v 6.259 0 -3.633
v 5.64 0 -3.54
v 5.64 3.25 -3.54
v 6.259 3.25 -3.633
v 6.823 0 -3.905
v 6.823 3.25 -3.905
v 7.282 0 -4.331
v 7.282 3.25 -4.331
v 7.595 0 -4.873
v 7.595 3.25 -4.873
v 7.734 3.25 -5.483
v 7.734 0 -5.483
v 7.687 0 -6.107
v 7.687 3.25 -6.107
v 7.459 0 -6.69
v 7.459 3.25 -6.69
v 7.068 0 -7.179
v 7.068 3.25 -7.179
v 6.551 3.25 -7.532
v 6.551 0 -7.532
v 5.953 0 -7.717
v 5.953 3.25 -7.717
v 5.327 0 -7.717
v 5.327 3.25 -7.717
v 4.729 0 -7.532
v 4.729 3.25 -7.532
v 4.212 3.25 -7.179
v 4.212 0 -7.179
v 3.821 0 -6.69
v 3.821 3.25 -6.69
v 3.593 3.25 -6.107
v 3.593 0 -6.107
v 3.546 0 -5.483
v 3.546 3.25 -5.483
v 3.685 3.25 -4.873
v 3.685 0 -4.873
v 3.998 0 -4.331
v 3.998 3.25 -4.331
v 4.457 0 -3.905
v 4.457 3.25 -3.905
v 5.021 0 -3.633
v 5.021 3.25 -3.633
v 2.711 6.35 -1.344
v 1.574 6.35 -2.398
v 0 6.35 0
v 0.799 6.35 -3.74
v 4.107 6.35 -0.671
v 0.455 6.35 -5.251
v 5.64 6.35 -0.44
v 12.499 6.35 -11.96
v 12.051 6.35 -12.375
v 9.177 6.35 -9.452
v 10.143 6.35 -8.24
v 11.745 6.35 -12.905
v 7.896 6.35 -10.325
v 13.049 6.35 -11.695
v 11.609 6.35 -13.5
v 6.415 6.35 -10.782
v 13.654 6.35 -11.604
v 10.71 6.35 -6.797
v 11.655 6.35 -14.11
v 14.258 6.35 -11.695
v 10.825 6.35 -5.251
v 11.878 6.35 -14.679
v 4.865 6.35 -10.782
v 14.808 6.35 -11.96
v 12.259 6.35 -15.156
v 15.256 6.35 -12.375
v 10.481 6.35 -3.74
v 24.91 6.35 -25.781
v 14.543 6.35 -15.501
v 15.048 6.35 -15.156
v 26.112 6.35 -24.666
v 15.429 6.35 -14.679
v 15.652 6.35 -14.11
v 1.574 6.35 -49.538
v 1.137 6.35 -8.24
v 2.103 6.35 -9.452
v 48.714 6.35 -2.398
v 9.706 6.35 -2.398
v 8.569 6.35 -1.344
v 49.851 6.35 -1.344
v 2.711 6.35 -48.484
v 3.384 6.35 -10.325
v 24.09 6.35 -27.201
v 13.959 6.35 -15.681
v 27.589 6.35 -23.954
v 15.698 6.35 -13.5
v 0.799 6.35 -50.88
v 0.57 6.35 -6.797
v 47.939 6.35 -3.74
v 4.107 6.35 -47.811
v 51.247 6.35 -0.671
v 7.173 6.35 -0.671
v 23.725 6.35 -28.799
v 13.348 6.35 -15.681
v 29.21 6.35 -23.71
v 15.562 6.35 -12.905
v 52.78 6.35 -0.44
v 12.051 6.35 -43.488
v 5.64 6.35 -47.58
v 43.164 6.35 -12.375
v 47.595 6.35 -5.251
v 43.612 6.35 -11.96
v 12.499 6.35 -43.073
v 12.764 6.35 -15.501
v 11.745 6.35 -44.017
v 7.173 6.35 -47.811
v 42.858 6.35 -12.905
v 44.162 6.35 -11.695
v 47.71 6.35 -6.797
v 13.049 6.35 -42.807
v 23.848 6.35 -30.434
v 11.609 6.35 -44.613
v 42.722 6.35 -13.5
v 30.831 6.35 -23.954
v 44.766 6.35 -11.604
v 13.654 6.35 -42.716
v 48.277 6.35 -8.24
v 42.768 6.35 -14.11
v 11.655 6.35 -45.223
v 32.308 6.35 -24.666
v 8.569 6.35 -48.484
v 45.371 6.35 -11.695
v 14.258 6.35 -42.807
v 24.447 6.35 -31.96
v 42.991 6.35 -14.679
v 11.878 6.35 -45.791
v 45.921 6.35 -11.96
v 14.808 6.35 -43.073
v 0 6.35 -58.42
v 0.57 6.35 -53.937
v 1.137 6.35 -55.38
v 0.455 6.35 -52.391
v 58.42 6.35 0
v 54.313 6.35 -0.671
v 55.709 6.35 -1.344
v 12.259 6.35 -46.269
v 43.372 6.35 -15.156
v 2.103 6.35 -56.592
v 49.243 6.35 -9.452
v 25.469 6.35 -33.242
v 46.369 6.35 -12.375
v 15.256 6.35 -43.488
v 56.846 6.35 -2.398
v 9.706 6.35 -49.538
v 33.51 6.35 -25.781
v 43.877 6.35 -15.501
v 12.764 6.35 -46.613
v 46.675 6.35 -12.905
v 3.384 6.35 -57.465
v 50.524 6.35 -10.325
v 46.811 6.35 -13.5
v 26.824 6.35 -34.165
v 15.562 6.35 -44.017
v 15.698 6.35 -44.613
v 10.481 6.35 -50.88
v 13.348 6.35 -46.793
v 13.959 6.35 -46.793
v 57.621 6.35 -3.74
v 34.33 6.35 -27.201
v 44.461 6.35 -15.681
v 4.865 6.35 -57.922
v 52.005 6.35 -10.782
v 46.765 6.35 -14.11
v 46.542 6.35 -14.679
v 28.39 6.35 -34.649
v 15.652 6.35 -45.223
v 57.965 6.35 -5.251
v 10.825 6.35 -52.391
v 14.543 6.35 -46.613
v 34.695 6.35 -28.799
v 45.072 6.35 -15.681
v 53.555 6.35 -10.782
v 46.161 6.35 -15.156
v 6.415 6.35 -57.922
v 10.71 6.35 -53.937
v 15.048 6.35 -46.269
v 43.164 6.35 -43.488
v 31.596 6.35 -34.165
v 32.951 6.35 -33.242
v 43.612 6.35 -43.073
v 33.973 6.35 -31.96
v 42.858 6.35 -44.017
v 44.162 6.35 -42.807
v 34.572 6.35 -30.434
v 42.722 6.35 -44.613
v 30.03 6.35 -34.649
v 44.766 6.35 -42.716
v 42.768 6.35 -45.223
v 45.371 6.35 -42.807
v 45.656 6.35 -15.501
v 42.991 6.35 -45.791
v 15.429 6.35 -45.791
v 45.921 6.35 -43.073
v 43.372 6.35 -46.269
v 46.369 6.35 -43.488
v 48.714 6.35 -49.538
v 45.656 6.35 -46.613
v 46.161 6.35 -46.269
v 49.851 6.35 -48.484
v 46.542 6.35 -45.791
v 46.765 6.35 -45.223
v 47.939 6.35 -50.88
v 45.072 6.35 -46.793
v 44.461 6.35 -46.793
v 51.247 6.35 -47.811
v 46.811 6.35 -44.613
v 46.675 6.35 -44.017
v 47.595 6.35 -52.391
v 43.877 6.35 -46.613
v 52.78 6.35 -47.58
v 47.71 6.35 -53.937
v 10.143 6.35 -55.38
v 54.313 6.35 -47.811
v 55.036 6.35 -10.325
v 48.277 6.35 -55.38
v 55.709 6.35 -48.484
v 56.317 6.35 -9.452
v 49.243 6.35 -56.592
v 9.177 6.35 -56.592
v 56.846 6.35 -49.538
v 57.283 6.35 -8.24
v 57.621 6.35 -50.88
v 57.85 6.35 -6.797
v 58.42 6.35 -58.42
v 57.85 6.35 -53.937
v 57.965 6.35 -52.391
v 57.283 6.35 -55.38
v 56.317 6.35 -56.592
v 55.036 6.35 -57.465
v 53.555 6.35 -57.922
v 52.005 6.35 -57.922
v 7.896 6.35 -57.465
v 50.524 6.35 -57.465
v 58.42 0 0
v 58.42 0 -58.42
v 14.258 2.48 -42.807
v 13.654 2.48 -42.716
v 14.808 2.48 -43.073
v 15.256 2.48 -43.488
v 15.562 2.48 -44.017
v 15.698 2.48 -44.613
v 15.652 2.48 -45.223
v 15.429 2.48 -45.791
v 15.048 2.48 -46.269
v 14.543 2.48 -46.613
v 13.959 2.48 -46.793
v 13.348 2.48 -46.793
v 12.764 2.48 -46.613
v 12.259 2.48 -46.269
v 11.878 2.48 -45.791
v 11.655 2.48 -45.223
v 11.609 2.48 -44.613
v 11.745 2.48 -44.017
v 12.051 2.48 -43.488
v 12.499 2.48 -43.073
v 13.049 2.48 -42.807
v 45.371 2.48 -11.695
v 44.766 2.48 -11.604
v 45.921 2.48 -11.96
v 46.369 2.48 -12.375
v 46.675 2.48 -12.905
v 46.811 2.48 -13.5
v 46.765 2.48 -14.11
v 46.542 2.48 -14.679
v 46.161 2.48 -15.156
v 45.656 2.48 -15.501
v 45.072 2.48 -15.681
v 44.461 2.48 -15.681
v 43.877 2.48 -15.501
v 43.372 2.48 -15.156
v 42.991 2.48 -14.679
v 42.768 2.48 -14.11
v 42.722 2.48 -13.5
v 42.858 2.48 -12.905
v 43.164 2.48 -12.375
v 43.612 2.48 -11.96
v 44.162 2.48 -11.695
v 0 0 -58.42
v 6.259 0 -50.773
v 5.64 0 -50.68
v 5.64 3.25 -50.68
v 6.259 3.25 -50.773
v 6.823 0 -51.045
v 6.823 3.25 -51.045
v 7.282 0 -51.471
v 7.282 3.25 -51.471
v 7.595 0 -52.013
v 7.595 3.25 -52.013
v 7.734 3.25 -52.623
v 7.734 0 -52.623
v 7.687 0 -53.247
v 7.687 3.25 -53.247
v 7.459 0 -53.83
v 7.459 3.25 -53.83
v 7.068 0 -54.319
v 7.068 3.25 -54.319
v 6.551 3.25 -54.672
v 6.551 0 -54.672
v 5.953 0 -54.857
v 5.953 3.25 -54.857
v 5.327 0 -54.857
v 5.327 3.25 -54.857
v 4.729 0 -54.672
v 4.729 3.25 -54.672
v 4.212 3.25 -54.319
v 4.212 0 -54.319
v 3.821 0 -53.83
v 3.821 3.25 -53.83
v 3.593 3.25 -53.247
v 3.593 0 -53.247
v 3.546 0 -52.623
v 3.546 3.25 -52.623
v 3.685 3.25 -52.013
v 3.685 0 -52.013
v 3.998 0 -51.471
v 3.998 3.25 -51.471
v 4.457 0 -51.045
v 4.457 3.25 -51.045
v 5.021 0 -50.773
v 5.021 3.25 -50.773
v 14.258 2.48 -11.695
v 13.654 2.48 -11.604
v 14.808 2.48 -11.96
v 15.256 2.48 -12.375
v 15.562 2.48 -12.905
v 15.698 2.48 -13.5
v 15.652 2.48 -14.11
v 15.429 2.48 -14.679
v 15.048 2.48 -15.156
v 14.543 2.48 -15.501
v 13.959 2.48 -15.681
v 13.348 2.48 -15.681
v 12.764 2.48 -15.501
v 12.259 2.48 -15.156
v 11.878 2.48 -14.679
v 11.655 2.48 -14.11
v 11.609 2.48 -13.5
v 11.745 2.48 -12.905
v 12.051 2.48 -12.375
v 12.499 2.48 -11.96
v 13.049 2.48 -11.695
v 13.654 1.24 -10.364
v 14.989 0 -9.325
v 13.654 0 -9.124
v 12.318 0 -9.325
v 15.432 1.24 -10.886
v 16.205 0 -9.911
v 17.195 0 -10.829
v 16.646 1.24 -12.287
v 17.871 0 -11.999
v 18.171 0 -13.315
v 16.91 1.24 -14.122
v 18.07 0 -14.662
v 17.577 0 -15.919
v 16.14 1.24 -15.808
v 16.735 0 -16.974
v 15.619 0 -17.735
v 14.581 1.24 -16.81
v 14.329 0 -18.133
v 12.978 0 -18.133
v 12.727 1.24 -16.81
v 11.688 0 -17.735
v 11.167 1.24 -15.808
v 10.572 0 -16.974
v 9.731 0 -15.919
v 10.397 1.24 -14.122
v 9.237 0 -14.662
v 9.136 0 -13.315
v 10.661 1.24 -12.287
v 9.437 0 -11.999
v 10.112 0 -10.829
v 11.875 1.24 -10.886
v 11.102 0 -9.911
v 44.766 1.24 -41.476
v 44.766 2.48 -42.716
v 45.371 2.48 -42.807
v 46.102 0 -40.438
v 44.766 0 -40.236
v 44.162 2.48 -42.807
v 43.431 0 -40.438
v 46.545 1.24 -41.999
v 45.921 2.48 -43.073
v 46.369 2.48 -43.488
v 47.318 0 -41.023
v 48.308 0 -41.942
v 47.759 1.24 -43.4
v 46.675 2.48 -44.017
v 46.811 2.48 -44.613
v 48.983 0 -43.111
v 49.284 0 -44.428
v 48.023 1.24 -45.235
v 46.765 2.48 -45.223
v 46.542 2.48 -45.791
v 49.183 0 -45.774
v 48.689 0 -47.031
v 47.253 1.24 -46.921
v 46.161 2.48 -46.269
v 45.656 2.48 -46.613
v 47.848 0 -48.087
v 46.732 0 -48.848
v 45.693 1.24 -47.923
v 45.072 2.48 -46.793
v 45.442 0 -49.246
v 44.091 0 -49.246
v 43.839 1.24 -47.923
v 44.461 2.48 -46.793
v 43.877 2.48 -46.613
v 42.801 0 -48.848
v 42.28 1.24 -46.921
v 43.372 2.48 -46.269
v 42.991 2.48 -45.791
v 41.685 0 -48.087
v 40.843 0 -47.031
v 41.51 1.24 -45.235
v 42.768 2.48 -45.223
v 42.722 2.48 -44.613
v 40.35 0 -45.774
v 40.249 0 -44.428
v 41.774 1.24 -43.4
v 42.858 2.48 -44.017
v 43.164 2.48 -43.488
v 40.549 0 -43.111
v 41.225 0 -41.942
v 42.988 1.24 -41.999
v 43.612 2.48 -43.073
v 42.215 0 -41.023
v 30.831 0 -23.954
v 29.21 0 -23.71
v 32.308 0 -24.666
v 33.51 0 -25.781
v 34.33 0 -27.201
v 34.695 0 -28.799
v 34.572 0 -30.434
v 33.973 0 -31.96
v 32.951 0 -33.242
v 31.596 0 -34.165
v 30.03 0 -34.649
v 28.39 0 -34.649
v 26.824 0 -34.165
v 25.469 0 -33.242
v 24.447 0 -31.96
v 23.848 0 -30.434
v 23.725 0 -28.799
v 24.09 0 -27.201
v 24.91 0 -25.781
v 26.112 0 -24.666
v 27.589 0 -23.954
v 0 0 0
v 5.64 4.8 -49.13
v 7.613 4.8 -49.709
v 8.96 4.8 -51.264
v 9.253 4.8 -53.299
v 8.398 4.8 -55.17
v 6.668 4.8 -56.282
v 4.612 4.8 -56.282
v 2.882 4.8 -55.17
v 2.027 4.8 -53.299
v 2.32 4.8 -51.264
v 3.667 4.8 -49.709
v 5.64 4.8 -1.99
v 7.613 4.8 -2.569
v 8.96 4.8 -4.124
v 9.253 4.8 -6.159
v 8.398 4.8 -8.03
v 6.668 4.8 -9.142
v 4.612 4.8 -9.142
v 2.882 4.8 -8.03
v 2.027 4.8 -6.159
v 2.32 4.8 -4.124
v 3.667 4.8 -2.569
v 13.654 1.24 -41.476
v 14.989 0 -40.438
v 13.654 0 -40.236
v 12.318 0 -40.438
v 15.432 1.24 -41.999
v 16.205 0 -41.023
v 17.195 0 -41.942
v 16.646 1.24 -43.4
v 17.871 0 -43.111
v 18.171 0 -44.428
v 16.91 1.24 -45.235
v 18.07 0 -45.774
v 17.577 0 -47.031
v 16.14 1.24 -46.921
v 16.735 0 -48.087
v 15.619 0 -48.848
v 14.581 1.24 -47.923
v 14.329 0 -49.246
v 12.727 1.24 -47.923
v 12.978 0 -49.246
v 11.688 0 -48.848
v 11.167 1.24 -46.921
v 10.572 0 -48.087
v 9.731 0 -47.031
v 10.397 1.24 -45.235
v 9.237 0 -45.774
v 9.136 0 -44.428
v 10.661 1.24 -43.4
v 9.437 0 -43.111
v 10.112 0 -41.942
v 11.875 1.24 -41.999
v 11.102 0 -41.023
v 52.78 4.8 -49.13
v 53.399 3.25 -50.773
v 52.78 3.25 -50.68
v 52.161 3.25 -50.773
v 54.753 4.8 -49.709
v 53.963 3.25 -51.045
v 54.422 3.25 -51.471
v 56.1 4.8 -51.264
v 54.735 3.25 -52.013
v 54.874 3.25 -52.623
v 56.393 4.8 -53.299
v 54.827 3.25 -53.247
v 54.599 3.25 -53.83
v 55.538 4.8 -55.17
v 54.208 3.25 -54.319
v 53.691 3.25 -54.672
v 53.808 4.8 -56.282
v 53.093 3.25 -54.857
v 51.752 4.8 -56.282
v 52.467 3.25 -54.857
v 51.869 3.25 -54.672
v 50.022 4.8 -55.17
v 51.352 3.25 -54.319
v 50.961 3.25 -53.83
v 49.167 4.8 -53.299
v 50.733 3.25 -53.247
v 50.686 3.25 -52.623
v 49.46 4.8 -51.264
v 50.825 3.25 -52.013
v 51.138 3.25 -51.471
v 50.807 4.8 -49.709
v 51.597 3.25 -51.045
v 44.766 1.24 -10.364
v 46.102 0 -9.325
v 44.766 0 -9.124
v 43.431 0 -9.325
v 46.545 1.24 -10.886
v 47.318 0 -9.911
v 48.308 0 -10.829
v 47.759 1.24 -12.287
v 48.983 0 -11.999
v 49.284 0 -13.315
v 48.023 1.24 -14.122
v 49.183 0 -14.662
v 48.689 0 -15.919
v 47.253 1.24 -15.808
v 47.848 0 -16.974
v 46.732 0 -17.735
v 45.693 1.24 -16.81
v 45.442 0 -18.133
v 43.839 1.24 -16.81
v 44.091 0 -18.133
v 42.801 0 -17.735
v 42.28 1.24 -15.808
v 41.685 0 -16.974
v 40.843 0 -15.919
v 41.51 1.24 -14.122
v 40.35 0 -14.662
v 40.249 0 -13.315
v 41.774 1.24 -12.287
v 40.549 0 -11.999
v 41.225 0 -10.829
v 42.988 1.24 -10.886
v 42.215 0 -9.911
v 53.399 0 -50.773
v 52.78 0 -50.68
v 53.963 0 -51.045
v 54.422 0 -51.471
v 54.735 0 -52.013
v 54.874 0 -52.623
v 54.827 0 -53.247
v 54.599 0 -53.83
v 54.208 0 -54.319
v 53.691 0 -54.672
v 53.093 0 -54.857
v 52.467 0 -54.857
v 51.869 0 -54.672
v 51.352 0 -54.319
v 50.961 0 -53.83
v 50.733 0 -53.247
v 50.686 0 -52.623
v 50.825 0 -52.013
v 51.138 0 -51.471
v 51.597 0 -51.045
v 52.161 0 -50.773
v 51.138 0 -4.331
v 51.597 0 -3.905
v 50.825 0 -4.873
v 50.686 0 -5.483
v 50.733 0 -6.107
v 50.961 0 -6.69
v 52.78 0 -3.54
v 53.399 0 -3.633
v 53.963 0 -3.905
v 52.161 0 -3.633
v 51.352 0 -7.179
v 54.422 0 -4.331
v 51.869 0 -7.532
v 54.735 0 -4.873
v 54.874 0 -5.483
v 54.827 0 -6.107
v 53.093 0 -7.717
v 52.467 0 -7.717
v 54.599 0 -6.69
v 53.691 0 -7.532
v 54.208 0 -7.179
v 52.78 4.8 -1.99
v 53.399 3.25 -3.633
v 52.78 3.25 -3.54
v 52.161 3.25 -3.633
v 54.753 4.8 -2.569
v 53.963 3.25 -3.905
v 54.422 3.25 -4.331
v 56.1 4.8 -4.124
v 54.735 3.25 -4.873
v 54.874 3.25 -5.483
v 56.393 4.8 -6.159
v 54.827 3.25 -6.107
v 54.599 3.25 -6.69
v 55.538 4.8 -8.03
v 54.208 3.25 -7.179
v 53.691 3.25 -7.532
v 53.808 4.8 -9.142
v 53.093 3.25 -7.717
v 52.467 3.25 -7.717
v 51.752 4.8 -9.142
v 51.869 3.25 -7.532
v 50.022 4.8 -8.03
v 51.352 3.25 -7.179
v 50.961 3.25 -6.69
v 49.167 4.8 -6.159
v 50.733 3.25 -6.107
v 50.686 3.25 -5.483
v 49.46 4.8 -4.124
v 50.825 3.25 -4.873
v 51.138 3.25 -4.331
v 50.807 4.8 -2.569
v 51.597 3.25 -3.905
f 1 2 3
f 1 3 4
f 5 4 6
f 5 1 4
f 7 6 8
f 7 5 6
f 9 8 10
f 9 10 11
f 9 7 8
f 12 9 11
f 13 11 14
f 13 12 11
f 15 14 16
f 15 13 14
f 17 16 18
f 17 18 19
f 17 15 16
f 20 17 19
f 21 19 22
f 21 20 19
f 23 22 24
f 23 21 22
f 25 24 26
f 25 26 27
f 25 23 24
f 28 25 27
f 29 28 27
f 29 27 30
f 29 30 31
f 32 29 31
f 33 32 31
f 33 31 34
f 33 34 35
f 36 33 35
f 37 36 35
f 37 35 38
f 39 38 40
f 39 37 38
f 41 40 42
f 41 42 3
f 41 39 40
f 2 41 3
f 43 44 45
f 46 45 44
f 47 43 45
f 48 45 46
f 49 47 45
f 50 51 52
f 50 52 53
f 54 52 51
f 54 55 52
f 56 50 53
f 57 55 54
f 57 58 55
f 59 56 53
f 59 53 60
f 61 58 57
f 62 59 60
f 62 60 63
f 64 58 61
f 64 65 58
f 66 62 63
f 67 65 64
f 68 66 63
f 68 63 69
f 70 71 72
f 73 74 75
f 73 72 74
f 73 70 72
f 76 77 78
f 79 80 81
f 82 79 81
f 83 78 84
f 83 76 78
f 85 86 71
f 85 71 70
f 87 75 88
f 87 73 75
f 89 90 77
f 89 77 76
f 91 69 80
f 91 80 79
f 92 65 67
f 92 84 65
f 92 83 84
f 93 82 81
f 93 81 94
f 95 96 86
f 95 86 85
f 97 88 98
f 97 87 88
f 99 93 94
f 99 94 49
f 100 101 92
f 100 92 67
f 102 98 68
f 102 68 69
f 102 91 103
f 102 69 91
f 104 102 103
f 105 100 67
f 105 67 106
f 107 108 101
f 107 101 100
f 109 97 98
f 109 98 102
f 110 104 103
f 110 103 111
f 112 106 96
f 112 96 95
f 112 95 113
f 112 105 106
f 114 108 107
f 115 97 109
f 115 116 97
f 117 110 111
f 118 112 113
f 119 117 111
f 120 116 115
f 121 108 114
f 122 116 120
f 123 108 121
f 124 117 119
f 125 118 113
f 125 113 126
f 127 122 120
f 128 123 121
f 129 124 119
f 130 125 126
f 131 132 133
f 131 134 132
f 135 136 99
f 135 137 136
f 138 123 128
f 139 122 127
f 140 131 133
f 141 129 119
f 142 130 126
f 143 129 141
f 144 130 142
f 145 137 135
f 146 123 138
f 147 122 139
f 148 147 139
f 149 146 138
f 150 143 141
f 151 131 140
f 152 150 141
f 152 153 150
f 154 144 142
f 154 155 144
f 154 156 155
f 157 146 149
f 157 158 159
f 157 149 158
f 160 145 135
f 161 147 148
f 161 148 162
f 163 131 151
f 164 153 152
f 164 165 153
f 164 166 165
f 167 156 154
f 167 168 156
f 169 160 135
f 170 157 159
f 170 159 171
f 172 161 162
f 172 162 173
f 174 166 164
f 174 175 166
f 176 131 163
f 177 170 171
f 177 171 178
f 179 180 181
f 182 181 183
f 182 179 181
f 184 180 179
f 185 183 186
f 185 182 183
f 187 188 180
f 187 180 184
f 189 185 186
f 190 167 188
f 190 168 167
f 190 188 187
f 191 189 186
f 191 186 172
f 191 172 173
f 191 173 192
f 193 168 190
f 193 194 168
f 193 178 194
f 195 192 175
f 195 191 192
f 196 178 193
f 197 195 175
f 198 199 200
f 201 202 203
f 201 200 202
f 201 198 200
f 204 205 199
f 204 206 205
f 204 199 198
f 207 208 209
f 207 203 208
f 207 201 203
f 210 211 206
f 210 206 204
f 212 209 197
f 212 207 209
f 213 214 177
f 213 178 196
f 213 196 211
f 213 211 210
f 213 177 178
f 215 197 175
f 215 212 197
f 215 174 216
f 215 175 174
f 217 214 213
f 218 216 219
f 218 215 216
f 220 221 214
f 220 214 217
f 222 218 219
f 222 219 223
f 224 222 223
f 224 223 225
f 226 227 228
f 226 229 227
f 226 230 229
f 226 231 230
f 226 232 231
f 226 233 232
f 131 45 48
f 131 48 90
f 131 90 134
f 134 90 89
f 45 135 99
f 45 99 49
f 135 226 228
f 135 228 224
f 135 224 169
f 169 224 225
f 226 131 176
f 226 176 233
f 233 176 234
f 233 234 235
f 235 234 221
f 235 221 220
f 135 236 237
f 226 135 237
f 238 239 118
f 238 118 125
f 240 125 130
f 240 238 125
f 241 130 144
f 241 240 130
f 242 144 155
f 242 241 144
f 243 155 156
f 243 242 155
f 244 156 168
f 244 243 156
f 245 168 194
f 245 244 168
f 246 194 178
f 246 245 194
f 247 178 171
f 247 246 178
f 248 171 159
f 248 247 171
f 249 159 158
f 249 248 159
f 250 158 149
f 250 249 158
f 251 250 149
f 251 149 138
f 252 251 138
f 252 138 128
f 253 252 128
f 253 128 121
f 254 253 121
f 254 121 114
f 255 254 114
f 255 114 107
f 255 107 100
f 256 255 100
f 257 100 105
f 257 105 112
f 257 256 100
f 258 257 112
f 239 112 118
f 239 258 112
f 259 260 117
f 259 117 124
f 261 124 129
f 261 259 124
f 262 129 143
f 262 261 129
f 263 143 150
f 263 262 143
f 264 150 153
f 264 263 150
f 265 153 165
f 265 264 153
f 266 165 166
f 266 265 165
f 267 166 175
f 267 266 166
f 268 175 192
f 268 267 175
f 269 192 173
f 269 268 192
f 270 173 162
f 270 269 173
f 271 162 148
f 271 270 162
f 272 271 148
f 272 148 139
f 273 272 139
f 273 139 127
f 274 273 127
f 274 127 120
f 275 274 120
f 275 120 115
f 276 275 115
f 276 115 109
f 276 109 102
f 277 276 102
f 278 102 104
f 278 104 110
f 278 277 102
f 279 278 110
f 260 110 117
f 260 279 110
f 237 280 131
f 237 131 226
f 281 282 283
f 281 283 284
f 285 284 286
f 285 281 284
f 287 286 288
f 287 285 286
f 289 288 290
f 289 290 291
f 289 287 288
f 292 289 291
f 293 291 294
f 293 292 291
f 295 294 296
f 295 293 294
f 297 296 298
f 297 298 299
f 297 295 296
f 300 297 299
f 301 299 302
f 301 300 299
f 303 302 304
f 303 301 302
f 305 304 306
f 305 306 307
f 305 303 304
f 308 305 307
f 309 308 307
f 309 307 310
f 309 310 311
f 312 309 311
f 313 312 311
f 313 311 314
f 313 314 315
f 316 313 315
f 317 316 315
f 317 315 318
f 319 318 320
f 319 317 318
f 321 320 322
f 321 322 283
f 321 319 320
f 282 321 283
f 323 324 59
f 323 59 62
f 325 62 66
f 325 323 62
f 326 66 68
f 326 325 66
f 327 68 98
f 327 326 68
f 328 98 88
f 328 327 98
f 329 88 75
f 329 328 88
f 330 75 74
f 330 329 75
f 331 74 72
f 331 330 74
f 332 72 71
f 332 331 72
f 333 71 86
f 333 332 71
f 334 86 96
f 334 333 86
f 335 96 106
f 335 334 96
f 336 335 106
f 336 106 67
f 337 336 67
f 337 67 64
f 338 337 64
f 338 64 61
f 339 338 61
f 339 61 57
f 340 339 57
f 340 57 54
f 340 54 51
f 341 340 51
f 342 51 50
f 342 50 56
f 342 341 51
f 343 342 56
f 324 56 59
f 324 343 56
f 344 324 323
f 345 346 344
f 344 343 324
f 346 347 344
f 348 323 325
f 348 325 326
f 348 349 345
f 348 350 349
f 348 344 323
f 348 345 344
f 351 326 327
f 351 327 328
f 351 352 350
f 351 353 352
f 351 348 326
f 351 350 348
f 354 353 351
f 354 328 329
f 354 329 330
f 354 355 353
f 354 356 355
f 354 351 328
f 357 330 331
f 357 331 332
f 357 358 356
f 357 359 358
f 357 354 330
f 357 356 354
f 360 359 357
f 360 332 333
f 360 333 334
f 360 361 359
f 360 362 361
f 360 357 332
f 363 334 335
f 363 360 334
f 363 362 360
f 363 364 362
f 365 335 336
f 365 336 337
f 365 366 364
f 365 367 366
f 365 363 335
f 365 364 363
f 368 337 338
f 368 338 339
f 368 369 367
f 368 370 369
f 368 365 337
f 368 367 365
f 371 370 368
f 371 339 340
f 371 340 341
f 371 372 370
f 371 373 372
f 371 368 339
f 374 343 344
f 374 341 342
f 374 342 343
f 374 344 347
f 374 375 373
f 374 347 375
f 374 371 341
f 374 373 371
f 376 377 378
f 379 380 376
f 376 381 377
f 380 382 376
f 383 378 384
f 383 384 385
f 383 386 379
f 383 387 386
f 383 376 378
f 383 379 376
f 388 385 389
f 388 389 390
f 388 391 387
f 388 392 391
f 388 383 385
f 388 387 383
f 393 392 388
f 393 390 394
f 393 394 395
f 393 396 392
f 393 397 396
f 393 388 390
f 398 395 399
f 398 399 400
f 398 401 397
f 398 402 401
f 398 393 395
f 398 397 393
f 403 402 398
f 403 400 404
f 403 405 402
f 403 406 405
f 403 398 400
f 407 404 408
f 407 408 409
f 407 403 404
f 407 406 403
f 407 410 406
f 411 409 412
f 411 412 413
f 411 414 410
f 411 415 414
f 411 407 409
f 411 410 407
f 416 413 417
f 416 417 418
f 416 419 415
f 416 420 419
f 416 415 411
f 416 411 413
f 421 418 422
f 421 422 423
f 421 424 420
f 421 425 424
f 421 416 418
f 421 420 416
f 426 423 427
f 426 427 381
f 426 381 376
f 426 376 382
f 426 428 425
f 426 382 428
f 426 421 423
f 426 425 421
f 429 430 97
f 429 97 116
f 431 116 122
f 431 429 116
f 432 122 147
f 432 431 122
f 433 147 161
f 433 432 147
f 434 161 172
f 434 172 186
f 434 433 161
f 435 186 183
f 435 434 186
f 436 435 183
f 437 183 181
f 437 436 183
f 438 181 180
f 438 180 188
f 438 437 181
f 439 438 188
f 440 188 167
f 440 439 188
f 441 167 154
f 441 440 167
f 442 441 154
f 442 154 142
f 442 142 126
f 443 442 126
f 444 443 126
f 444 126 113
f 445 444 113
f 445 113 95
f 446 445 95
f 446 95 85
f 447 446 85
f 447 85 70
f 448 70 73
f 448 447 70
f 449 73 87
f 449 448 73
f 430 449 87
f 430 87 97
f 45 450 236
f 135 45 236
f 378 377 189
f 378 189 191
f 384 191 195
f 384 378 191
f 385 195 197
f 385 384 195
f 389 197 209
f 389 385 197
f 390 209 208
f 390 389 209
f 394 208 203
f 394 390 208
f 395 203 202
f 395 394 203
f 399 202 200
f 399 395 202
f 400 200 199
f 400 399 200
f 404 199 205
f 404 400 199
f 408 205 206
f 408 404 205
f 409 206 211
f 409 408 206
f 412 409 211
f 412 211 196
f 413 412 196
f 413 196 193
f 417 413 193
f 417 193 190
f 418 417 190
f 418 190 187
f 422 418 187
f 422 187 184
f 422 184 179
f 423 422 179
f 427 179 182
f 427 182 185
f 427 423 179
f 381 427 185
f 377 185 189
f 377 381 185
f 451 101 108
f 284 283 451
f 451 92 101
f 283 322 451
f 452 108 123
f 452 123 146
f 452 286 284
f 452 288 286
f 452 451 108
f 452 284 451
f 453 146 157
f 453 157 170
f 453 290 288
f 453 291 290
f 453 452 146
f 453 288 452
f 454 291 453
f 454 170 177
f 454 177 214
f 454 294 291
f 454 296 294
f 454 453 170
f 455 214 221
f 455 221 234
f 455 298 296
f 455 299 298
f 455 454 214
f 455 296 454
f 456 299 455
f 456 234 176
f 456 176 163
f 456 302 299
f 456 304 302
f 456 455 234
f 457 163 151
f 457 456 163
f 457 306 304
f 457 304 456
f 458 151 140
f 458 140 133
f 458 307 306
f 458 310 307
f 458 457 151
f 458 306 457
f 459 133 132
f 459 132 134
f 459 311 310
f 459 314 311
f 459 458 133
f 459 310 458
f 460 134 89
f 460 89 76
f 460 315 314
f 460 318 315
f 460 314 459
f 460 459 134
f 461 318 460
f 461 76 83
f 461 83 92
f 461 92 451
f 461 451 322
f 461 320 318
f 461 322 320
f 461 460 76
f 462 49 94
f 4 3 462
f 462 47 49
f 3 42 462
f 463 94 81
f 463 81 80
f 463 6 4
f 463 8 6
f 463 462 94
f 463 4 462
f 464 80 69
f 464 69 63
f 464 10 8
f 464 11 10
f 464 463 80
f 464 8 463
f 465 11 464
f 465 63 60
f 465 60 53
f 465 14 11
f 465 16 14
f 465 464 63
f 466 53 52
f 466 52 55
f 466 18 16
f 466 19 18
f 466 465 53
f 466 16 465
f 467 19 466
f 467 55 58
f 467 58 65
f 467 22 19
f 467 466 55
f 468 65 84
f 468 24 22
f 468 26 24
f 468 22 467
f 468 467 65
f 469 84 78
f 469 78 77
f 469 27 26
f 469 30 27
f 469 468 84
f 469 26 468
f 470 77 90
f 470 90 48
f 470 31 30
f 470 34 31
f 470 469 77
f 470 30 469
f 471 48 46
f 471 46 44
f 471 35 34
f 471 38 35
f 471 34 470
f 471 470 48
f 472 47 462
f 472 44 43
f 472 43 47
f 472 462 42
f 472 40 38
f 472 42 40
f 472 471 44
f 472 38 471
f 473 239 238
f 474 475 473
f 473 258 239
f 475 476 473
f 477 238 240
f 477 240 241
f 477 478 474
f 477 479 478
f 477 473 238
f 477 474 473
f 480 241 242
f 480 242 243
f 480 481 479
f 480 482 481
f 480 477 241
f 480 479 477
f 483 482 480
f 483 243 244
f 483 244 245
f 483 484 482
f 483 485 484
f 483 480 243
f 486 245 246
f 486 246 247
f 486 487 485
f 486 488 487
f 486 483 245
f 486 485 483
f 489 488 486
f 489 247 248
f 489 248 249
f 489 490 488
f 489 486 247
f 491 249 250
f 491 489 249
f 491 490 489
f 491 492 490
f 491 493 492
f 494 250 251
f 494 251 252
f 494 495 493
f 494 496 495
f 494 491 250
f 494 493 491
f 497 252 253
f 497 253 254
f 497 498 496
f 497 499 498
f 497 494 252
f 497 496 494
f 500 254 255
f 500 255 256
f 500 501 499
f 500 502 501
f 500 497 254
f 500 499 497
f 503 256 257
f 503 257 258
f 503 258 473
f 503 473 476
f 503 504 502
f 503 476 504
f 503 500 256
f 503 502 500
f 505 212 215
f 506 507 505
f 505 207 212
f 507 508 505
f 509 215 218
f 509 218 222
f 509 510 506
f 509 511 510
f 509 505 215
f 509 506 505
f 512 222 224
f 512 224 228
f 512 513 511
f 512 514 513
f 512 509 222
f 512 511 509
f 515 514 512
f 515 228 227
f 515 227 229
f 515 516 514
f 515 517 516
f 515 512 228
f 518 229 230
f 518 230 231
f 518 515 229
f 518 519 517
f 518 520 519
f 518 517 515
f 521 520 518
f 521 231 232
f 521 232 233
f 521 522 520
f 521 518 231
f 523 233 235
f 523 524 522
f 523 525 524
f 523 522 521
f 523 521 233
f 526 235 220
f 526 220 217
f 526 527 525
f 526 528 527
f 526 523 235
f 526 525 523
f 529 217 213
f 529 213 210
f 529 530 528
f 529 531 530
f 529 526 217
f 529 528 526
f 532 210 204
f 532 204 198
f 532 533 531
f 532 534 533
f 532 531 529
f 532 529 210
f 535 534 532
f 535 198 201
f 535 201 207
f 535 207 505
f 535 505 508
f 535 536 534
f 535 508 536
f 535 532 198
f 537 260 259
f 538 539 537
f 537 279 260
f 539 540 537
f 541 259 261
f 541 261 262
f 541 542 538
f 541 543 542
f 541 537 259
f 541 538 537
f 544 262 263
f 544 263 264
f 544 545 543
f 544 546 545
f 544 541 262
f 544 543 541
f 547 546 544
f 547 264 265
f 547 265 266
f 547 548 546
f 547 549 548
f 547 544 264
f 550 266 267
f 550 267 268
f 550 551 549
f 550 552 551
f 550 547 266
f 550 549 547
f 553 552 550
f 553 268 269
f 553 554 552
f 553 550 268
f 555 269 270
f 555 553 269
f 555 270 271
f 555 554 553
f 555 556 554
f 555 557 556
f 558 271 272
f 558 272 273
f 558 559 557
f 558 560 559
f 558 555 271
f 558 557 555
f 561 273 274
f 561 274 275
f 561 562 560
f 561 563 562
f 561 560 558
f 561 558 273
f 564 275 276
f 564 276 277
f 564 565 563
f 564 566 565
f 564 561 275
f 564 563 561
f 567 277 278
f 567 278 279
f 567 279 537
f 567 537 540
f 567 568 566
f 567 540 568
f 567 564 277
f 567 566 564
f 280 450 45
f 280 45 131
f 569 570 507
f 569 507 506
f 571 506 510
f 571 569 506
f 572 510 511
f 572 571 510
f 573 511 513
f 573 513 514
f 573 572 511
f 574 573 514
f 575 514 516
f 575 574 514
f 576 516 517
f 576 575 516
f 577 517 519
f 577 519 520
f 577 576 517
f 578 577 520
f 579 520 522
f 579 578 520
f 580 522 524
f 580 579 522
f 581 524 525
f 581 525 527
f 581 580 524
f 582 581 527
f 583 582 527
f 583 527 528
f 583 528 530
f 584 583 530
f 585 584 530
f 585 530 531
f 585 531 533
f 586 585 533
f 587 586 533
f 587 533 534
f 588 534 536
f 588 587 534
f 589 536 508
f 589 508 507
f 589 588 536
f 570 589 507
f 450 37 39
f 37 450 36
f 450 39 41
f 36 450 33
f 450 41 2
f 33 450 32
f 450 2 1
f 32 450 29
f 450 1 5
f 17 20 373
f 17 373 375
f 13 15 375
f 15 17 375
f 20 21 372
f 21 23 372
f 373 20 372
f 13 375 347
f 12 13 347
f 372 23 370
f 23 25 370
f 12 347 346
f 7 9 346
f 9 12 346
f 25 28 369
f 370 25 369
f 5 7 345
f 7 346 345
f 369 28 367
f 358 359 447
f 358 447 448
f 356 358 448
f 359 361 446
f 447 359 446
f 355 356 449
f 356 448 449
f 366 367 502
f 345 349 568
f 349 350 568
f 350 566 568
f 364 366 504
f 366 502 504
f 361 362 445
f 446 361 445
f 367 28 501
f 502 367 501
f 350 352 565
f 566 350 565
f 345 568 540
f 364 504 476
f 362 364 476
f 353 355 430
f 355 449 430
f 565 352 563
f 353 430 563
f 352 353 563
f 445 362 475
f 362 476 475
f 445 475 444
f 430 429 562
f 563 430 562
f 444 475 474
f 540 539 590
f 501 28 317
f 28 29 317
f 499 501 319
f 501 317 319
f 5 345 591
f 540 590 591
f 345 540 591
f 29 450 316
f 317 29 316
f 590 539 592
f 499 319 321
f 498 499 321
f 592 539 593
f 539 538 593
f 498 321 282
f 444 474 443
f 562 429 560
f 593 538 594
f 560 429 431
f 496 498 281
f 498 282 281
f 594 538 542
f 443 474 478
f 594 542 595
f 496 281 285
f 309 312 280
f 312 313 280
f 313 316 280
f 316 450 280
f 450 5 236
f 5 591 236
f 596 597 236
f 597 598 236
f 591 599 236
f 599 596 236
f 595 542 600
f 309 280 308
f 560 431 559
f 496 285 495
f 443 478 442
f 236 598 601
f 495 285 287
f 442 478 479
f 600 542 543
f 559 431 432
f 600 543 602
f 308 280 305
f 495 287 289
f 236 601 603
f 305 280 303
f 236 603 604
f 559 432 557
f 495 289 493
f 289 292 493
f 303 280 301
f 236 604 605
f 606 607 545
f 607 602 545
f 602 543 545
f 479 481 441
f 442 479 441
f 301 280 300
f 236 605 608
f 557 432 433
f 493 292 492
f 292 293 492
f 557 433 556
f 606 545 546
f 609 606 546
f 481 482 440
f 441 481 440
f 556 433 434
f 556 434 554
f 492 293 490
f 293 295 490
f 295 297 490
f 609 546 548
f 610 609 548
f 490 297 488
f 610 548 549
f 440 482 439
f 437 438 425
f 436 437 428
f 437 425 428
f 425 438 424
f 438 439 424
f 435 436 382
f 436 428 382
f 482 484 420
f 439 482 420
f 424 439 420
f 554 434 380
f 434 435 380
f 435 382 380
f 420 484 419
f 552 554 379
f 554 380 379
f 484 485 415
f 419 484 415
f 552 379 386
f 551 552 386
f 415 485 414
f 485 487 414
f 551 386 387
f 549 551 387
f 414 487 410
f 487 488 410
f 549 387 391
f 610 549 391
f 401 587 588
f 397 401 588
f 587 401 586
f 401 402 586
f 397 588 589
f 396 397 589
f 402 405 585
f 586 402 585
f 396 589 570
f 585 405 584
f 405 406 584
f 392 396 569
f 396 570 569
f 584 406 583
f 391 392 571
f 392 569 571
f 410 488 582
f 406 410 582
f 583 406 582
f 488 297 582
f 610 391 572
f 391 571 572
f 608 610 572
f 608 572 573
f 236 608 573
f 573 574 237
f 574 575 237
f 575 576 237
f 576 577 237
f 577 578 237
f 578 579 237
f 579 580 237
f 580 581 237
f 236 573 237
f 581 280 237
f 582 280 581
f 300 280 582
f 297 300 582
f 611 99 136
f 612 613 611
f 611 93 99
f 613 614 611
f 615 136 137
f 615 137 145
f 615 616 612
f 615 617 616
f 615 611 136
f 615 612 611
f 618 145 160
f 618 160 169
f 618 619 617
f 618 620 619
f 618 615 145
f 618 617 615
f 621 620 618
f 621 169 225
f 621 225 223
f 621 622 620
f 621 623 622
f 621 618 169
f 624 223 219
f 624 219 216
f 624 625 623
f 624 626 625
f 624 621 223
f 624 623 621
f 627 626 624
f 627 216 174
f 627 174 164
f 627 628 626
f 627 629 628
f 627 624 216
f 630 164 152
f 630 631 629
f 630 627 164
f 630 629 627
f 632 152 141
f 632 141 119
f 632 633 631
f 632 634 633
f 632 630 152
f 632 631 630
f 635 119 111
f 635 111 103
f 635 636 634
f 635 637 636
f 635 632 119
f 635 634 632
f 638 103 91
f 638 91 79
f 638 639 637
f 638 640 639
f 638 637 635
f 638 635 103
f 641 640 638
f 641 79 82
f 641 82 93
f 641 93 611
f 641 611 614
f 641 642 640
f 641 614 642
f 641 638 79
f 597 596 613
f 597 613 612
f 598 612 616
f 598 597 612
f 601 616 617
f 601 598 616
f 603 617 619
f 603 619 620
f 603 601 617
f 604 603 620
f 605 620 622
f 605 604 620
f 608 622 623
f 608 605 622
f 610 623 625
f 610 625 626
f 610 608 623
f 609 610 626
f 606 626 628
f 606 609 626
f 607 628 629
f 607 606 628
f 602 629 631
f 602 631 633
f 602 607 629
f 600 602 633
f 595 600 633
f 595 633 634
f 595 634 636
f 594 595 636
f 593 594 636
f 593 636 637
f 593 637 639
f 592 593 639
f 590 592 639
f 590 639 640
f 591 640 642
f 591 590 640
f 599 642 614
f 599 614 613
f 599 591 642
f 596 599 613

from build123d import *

# Parameters (mm, degrees)
SKETCH1_W           = 58.42
SKETCH1_H           = 58.42
SKETCH1_R           = 2.1
SKETCH1_R_2         = 5.5
SKETCH1_R_3         = 2.05
BOSS_EXTRUDE1_DEPTH = 6.35
CHAMFER1_SIZE       = 2.48
CHAMFER2_SIZE       = 3.1


with BuildPart() as part:
    # Sketch1 → Boss-Extrude1 (new body)
    with BuildSketch(Plane(origin=(0, 0, 0), x_dir=(1, 0, 0), z_dir=(0, 1, 0))):
        with Locations((29.21, 29.21)):
            Rectangle(SKETCH1_W, SKETCH1_H)
        with Locations(Location((5.64, 52.78, 0), (0, 0, 270))):
            Circle(SKETCH1_R, mode=Mode.SUBTRACT)
        with Locations(Location((52.78, 52.78, 0), (0, 0, 270))):
            Circle(SKETCH1_R, mode=Mode.SUBTRACT)
        with Locations(Location((52.78, 5.64, 0), (0, 0, 270))):
            Circle(SKETCH1_R, mode=Mode.SUBTRACT)
        with Locations(Location((5.64, 5.64, 0), (0, 0, 270))):
            Circle(SKETCH1_R, mode=Mode.SUBTRACT)
        with Locations(Location((29.21, 29.21, 0), (0, 0, 270))):
            Circle(SKETCH1_R_2, mode=Mode.SUBTRACT)
        with Locations(Location((13.653650814, 44.766349186, 0), (0, 0, 270))):
            Circle(SKETCH1_R_3, mode=Mode.SUBTRACT)
        with Locations(Location((44.766349186, 44.766349186, 0), (0, 0, 270))):
            Circle(SKETCH1_R_3, mode=Mode.SUBTRACT)
        with Locations(Location((44.766349186, 13.653650814, 0), (0, 0, 270))):
            Circle(SKETCH1_R_3, mode=Mode.SUBTRACT)
        with Locations(Location((13.653650814, 13.653650814, 0), (0, 0, 270))):
            Circle(SKETCH1_R_3, mode=Mode.SUBTRACT)
    extrude(amount=BOSS_EXTRUDE1_DEPTH)

    # Chamfer1
    chamfer1_edges = [part.edges().sort_by_distance(p)[0] for p in [
        (13.653650814, 0, -46.816349186),
        (44.766349186, 0, -46.816349186),
        (44.766349186, 0, -15.703650814),
        (13.653650814, 0, -15.703650814),
    ]]
    chamfer(chamfer1_edges, length=CHAMFER1_SIZE)

    # Chamfer2
    chamfer2_edges = [part.edges().sort_by_distance(p)[0] for p in [
        (5.64, 6.35, -54.88),
        (52.78, 6.35, -54.88),
        (52.78, 6.35, -7.74),
        (5.64, 6.35, -7.74),
    ]]
    chamfer(chamfer2_edges, length=CHAMFER2_SIZE)


solid = part.part
